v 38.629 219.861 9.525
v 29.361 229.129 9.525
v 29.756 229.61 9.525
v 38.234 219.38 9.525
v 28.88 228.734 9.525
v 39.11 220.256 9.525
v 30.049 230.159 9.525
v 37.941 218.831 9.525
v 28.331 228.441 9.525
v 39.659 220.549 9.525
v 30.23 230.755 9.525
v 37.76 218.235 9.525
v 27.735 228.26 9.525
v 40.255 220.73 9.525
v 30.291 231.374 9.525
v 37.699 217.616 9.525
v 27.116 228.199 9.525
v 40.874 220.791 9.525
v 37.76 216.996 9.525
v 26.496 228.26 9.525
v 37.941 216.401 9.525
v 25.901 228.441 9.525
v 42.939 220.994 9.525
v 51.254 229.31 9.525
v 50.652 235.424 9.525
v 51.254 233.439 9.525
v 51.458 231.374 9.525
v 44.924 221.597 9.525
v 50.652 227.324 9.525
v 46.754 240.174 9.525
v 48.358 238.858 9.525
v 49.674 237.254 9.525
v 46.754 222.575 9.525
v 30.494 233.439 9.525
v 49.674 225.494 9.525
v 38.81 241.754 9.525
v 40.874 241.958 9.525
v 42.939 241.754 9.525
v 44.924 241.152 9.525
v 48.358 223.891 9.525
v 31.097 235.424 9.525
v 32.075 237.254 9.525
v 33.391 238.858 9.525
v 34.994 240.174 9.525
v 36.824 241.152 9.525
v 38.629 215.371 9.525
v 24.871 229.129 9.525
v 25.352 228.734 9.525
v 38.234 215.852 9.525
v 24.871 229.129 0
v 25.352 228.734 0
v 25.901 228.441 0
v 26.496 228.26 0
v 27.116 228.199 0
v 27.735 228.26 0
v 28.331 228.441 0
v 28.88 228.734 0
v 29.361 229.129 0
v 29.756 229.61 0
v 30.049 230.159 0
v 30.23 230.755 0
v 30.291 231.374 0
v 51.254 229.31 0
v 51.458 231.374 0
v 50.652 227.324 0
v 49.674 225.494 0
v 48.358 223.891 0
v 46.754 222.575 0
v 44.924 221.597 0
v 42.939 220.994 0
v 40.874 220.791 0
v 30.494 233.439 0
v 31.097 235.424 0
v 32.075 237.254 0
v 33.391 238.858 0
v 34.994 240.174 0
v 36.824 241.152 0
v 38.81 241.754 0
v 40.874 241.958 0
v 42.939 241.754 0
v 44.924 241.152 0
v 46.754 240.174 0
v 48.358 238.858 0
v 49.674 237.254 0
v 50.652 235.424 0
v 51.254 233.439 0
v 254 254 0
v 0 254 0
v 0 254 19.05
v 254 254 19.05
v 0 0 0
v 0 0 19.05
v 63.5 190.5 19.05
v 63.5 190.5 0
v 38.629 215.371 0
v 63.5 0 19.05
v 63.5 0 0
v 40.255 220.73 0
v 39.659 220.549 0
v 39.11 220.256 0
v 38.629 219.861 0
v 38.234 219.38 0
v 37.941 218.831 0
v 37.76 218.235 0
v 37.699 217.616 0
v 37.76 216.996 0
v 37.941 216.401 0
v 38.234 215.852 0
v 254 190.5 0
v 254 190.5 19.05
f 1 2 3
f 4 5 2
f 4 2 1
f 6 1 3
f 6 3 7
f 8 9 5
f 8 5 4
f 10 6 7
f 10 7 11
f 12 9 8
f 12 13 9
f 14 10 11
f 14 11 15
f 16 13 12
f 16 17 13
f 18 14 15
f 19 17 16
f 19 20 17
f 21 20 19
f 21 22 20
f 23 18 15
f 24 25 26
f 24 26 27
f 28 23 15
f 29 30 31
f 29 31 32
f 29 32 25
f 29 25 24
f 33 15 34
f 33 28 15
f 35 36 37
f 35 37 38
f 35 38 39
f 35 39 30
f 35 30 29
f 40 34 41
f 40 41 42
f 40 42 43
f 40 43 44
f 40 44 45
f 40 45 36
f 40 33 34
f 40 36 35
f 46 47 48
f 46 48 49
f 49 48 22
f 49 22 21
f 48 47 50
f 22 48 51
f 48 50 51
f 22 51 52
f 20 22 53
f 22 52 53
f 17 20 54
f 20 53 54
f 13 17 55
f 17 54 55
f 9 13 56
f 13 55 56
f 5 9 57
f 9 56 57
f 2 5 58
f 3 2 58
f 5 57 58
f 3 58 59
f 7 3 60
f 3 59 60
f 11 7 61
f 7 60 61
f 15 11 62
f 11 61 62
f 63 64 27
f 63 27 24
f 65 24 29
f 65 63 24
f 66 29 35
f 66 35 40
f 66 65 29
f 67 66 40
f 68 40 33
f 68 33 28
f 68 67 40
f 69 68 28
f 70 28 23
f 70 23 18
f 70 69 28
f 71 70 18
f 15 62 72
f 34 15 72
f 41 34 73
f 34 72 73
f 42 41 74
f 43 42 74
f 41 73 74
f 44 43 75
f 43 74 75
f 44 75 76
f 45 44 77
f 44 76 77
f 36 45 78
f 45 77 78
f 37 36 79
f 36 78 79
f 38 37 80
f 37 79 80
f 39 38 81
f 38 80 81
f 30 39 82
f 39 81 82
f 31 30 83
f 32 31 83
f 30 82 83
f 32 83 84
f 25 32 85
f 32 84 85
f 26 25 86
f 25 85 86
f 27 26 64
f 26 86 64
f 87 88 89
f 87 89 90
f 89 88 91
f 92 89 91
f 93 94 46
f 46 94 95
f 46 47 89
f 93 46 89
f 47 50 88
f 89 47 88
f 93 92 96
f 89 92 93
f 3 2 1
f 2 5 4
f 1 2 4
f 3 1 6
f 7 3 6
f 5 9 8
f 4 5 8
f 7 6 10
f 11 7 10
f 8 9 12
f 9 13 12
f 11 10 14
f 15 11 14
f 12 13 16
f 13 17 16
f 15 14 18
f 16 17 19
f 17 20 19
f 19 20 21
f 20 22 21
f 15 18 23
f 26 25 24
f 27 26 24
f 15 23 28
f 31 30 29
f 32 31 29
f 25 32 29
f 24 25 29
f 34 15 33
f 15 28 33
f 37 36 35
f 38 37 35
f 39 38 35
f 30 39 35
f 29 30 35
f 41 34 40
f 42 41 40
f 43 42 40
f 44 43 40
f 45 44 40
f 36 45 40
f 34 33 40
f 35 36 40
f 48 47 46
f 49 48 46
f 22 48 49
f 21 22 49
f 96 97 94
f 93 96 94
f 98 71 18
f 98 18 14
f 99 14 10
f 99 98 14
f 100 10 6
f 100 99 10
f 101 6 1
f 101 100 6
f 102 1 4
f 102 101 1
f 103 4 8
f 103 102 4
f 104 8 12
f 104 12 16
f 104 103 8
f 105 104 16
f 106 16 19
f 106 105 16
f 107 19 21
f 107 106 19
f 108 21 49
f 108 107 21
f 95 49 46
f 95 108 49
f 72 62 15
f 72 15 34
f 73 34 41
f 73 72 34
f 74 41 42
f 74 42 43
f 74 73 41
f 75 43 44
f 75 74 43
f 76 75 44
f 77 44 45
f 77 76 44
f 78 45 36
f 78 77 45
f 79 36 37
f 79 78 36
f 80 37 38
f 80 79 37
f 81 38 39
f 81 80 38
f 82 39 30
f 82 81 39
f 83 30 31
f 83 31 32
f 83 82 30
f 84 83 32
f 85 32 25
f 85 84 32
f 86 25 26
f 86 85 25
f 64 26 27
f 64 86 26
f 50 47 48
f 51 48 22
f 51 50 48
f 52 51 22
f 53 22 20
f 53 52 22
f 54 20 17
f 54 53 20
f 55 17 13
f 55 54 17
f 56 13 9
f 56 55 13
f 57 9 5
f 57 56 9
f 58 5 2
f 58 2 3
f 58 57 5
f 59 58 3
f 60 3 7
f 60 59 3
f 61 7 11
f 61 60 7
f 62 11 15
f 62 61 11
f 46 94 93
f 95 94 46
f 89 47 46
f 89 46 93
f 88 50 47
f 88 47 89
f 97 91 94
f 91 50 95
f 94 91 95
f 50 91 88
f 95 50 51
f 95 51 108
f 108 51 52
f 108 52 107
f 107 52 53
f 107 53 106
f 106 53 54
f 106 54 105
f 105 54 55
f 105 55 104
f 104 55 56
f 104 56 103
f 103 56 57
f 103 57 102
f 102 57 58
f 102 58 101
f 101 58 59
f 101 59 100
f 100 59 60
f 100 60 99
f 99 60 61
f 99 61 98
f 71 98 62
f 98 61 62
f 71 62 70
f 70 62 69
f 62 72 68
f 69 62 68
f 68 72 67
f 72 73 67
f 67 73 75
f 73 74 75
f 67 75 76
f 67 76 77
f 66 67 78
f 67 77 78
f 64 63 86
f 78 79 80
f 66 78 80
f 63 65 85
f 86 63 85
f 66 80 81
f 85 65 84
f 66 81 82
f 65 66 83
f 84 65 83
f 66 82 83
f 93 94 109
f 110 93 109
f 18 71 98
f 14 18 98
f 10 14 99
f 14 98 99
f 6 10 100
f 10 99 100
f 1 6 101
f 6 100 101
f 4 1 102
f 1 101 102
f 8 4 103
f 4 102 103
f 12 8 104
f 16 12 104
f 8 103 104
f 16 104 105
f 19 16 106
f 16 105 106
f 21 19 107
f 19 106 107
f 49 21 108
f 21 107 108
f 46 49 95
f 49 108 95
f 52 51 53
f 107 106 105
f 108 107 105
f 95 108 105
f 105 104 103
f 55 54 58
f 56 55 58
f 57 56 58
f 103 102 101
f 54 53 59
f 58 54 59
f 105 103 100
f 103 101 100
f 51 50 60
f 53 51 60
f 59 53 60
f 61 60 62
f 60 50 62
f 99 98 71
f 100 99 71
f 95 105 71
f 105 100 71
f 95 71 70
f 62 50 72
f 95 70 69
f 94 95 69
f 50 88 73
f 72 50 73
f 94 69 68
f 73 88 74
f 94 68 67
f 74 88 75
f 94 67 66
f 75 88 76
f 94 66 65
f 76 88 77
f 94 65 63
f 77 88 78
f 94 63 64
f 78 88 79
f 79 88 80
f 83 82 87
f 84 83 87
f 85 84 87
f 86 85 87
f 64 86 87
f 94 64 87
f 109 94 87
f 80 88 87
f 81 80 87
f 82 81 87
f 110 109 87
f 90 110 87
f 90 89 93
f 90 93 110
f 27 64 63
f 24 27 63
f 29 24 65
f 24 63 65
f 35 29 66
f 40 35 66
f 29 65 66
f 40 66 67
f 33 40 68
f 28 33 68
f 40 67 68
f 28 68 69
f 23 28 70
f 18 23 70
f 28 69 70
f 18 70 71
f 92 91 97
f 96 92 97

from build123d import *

# Parameters (mm, degrees)
F2_DEPTH = 19.05
F4_DEPTH = 9.525
F5_W     = 254
F5_H     = 63.5
F6_DEPTH = 19.05


# Not quite as in the source:
# - a variable given as a bare number and used for a length is read in inches; the dataset says mm whatever the document's units were


with BuildPart() as f2:
    # F1 (on Top) → F2 (new body)
    with BuildSketch(Plane.XY):
        Polygon((0, 254), (0, 0), (63.5, 0), (63.5, 190.5), align=None)
    extrude(amount=F2_DEPTH)

    # F3 (on face) → F4 (join)
    with BuildSketch(Plane(origin=(0, 0, 0), x_dir=(1, 0, 0), z_dir=(0, 0, -1))):
        with BuildLine():
            ThreePointArc((40.8742306969, -220.7908973636), (33.3906839294, -223.8906839294), (30.2908973636, -231.3742306969))
            ThreePointArc((30.2908973636, -231.3742306969), (40.8742306969, -241.9575640303), (51.4575640303, -231.3742306969))
            ThreePointArc((51.4575640303, -231.3742306969), (48.3577774645, -223.8906839294), (40.8742306969, -220.7908973636))
        make_face()
        with BuildLine():
            ThreePointArc((24.8708333161, -229.1291666839), (28.3309172501, -228.4409131765), (30.2908973636, -231.3742306969))
            ThreePointArc((30.2908973636, -231.3742306969), (33.3906839294, -223.8906839294), (40.8742306969, -220.7908973636))
            ThreePointArc((40.8742306969, -220.7908973636), (37.9409131848, -218.83091727), (38.6291666535, -215.3708333465))
            Line((38.6291666535, -215.3708333465), (24.8708333161, -229.1291666839))
        make_face()
    extrude(amount=-F4_DEPTH)


with BuildPart() as f6:
    # F5 (on Top) → F6 (new body)
    with BuildSketch(Plane.XY):
        with Locations((127, 222.25)):
            Rectangle(F5_W, F5_H)
    extrude(amount=F6_DEPTH)

    # F7: cut F2
    add(f2.part, mode=Mode.SUBTRACT)


solid = Compound([f2.part, f6.part])
